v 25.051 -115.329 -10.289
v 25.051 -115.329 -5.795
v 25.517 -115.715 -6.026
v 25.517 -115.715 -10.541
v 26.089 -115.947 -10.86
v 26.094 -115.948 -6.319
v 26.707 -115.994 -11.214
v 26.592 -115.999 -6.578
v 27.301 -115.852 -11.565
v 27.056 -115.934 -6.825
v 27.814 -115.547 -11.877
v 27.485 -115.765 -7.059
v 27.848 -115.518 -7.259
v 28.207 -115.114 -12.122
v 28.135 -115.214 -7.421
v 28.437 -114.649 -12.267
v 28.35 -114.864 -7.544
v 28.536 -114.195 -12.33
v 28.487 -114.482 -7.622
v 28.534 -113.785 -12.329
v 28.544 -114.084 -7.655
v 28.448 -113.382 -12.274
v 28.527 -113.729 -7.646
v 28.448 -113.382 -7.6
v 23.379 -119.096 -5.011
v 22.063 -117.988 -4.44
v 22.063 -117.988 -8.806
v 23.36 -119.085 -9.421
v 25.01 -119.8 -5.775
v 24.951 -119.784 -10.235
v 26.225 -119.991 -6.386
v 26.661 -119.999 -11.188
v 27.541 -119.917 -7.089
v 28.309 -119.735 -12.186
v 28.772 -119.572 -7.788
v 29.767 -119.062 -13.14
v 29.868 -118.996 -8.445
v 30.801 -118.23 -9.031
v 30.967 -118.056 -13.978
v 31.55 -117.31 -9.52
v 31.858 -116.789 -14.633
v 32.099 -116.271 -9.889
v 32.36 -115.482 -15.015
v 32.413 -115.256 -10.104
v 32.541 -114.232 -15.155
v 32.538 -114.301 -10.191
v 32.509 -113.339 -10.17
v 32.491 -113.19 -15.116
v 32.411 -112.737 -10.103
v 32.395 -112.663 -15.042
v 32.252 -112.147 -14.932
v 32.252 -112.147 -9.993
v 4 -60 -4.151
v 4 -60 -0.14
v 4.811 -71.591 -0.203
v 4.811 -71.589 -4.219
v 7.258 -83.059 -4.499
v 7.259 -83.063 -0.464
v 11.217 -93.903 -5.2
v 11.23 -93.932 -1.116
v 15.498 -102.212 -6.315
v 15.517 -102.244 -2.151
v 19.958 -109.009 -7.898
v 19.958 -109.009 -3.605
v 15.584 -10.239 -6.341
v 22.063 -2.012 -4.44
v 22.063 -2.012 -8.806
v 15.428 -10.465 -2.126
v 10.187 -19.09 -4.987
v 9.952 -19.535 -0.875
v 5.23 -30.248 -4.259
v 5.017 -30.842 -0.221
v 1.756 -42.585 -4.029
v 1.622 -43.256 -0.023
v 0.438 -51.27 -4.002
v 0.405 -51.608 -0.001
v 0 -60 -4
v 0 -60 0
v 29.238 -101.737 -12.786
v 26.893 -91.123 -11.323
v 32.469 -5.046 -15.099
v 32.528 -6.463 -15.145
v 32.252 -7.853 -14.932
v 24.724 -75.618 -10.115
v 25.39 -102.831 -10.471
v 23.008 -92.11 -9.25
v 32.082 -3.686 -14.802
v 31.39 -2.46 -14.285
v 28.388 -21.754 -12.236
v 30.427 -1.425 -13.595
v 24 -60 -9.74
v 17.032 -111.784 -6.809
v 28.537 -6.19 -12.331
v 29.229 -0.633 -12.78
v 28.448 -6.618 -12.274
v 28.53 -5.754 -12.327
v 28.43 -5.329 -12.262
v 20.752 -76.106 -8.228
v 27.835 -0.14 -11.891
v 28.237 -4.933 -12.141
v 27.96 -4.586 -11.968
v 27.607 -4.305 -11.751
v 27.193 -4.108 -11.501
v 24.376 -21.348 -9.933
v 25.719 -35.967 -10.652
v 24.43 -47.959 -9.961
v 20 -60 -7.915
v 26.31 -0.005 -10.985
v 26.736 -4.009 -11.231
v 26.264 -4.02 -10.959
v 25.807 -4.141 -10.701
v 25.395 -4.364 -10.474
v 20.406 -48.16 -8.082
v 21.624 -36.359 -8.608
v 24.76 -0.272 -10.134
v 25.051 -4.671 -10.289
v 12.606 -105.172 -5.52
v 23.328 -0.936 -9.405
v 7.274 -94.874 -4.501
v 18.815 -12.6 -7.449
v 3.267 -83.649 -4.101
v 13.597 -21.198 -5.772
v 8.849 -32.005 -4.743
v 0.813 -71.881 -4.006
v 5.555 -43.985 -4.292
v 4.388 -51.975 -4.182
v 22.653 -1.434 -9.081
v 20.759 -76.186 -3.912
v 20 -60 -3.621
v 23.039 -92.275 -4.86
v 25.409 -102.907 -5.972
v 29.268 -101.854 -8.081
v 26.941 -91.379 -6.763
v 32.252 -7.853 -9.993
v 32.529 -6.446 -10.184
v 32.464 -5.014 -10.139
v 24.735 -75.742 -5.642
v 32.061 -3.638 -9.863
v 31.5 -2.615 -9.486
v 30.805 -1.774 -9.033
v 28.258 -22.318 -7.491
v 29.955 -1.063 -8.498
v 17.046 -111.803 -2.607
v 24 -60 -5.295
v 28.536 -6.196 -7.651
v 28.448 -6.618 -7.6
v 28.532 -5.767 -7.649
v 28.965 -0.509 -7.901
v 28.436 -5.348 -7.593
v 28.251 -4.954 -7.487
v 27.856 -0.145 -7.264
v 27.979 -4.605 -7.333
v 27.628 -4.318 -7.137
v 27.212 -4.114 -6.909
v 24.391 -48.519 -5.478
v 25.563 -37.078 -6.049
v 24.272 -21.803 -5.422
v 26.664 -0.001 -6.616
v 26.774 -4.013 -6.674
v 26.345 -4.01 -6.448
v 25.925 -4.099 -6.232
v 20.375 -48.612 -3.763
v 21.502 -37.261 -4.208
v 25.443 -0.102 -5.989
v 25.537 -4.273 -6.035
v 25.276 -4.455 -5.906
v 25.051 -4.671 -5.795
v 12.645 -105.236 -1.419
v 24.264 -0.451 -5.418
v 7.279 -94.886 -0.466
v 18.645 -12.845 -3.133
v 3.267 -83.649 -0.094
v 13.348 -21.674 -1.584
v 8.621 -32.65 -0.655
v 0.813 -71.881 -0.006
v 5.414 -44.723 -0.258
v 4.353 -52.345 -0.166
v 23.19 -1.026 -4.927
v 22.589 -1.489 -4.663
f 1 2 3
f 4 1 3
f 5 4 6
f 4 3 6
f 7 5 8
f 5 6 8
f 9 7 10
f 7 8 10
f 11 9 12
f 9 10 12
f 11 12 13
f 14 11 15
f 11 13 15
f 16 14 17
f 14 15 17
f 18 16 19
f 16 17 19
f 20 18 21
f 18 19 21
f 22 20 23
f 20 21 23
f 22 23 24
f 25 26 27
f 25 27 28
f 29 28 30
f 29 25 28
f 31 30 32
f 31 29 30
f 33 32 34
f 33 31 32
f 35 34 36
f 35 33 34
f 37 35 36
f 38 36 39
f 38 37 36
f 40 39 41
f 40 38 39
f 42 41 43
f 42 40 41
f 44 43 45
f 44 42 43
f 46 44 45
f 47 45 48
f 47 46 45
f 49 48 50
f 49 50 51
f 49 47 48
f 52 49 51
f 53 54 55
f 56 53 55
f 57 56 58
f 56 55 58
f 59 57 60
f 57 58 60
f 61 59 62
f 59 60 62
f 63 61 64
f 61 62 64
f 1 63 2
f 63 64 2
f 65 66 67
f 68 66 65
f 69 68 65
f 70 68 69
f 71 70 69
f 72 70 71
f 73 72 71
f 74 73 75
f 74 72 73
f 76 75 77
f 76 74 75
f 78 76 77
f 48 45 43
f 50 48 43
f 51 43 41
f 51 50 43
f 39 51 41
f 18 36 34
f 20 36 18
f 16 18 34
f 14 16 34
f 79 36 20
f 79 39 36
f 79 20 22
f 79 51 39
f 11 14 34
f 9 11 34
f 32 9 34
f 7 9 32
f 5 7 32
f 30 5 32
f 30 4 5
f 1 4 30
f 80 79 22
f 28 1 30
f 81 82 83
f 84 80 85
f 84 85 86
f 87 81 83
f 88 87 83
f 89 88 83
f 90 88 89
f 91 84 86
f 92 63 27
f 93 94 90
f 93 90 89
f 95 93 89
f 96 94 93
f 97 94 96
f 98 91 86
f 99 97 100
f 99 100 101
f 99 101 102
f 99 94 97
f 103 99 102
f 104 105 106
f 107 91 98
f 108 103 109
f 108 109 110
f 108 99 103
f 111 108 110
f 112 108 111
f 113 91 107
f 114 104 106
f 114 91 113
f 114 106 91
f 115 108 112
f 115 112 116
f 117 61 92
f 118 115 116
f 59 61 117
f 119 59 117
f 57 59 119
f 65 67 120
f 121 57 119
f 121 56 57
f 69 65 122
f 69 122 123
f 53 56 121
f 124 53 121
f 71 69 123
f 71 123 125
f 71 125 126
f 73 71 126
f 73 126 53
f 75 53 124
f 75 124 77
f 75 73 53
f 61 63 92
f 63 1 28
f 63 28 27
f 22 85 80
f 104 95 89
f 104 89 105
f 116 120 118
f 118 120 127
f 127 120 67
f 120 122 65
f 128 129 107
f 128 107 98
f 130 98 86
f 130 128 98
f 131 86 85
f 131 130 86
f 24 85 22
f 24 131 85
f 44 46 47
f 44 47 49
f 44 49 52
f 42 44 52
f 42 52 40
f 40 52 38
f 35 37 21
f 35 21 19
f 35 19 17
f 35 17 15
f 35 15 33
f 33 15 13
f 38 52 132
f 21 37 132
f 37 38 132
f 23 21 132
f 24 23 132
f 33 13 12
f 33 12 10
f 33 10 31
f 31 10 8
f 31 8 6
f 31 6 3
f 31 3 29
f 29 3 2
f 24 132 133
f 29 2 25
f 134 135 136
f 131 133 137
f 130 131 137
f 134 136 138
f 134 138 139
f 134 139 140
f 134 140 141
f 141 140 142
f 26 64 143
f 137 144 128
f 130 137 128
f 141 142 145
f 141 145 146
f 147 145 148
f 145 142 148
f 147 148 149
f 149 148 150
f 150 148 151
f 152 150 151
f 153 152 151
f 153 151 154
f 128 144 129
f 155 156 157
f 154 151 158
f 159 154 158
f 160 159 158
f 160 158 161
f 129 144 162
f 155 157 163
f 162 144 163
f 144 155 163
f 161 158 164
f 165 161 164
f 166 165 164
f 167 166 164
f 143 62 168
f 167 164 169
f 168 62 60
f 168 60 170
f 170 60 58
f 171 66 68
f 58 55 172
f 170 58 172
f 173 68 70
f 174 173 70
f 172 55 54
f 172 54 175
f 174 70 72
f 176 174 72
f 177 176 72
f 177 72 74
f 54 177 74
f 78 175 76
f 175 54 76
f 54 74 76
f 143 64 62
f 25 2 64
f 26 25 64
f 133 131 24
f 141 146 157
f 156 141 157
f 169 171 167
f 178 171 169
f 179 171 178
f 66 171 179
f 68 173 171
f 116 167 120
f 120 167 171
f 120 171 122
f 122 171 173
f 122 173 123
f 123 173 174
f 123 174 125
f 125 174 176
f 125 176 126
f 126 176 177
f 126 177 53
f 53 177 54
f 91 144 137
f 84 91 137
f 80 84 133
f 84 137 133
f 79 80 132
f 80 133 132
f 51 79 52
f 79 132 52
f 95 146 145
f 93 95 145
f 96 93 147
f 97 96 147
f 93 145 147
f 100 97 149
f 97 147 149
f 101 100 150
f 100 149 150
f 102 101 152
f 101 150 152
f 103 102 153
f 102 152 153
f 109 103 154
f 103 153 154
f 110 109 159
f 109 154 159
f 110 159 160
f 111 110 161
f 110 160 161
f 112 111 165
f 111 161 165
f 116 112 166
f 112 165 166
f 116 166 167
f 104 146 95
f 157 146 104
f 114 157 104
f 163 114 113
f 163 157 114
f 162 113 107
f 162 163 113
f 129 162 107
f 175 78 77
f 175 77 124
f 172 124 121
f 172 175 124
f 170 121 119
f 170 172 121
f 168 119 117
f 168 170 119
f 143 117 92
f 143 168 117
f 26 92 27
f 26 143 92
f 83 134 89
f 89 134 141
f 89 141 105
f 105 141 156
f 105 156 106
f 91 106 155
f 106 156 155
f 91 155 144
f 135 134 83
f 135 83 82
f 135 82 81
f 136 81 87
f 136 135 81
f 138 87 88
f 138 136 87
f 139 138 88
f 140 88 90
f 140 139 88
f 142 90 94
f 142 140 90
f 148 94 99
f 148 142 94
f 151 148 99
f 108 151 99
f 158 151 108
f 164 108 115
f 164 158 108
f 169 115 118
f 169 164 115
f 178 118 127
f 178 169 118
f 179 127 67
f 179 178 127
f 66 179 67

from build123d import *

# Parameters (mm, degrees)
PAD_DEPTH    = 120
SKETCH001_W  = 106.691582
SKETCH001_H  = 157.654909
POCKET_DEPTH = 17.1595098612


with BuildPart() as part:
    # Sketch → Pad (new body)
    with BuildSketch(Plane.XZ):
        with BuildLine():
            ThreePointArc((35, -12), (18.5, -3.0833333333), (0, 0))
            Line((0, 0), (0, -4))
            ThreePointArc((32.5456537619, -15.1585098612), (17.2027027027, -6.8671171171), (0, -4))
            Line((32.5456537619, -15.1585098612), (35, -12))
        make_face()
    extrude(amount=PAD_DEPTH)

    # Sketch001 (on DatumPlane) → Pocket (cut, through all)
    with BuildSketch(Plane.XY.offset(2)):
        with Locations((20.474781, -55.6624445)):
            Rectangle(SKETCH001_W, SKETCH001_H)
        with BuildLine():
            ThreePointArc((32.2524687129, -7.8526368005), (29.5296070486, -0.7946159813), (22.0631189103, -2.0116568221))
            ThreePointArc((22.0631189103, -2.0116568221), (5.7021367812, -28.9781159479), (0, -60))
            ThreePointArc((0, -60), (5.7021367812, -91.0218840521), (22.0631189103, -117.9883431779))
            ThreePointArc((22.0631189103, -117.9883431779), (29.5296070486, -119.2053840187), (32.2524687129, -112.1473631995))
            ThreePointArc((24, -60), (26.075875076, -86.3981567942), (32.2524687129, -112.1473631995))
            ThreePointArc((32.2524687129, -7.8526368005), (26.075875076, -33.6018432058), (24, -60))
        make_face(mode=Mode.SUBTRACT)
        with BuildLine():
            ThreePointArc((25.051475478, -115.329447726), (27.5403048575, -115.7351280062), (28.4479254122, -113.3824543998))
            ThreePointArc((20, -60), (22.1250414169, -87.0233874705), (28.4479254122, -113.3824543998))
            ThreePointArc((28.4479254122, -6.6175456002), (22.1250414169, -32.9766125295), (20, -60))
            ThreePointArc((28.4479254122, -6.6175456002), (27.5403048575, -4.2648719938), (25.051475478, -4.670552274))
            ThreePointArc((25.051475478, -4.670552274), (9.4406810347, -30.4005388332), (4, -60))
            ThreePointArc((4, -60), (9.4406810347, -89.5994611668), (25.051475478, -115.329447726))
        make_face()
    extrude(amount=-POCKET_DEPTH, mode=Mode.SUBTRACT)


solid = part.part
